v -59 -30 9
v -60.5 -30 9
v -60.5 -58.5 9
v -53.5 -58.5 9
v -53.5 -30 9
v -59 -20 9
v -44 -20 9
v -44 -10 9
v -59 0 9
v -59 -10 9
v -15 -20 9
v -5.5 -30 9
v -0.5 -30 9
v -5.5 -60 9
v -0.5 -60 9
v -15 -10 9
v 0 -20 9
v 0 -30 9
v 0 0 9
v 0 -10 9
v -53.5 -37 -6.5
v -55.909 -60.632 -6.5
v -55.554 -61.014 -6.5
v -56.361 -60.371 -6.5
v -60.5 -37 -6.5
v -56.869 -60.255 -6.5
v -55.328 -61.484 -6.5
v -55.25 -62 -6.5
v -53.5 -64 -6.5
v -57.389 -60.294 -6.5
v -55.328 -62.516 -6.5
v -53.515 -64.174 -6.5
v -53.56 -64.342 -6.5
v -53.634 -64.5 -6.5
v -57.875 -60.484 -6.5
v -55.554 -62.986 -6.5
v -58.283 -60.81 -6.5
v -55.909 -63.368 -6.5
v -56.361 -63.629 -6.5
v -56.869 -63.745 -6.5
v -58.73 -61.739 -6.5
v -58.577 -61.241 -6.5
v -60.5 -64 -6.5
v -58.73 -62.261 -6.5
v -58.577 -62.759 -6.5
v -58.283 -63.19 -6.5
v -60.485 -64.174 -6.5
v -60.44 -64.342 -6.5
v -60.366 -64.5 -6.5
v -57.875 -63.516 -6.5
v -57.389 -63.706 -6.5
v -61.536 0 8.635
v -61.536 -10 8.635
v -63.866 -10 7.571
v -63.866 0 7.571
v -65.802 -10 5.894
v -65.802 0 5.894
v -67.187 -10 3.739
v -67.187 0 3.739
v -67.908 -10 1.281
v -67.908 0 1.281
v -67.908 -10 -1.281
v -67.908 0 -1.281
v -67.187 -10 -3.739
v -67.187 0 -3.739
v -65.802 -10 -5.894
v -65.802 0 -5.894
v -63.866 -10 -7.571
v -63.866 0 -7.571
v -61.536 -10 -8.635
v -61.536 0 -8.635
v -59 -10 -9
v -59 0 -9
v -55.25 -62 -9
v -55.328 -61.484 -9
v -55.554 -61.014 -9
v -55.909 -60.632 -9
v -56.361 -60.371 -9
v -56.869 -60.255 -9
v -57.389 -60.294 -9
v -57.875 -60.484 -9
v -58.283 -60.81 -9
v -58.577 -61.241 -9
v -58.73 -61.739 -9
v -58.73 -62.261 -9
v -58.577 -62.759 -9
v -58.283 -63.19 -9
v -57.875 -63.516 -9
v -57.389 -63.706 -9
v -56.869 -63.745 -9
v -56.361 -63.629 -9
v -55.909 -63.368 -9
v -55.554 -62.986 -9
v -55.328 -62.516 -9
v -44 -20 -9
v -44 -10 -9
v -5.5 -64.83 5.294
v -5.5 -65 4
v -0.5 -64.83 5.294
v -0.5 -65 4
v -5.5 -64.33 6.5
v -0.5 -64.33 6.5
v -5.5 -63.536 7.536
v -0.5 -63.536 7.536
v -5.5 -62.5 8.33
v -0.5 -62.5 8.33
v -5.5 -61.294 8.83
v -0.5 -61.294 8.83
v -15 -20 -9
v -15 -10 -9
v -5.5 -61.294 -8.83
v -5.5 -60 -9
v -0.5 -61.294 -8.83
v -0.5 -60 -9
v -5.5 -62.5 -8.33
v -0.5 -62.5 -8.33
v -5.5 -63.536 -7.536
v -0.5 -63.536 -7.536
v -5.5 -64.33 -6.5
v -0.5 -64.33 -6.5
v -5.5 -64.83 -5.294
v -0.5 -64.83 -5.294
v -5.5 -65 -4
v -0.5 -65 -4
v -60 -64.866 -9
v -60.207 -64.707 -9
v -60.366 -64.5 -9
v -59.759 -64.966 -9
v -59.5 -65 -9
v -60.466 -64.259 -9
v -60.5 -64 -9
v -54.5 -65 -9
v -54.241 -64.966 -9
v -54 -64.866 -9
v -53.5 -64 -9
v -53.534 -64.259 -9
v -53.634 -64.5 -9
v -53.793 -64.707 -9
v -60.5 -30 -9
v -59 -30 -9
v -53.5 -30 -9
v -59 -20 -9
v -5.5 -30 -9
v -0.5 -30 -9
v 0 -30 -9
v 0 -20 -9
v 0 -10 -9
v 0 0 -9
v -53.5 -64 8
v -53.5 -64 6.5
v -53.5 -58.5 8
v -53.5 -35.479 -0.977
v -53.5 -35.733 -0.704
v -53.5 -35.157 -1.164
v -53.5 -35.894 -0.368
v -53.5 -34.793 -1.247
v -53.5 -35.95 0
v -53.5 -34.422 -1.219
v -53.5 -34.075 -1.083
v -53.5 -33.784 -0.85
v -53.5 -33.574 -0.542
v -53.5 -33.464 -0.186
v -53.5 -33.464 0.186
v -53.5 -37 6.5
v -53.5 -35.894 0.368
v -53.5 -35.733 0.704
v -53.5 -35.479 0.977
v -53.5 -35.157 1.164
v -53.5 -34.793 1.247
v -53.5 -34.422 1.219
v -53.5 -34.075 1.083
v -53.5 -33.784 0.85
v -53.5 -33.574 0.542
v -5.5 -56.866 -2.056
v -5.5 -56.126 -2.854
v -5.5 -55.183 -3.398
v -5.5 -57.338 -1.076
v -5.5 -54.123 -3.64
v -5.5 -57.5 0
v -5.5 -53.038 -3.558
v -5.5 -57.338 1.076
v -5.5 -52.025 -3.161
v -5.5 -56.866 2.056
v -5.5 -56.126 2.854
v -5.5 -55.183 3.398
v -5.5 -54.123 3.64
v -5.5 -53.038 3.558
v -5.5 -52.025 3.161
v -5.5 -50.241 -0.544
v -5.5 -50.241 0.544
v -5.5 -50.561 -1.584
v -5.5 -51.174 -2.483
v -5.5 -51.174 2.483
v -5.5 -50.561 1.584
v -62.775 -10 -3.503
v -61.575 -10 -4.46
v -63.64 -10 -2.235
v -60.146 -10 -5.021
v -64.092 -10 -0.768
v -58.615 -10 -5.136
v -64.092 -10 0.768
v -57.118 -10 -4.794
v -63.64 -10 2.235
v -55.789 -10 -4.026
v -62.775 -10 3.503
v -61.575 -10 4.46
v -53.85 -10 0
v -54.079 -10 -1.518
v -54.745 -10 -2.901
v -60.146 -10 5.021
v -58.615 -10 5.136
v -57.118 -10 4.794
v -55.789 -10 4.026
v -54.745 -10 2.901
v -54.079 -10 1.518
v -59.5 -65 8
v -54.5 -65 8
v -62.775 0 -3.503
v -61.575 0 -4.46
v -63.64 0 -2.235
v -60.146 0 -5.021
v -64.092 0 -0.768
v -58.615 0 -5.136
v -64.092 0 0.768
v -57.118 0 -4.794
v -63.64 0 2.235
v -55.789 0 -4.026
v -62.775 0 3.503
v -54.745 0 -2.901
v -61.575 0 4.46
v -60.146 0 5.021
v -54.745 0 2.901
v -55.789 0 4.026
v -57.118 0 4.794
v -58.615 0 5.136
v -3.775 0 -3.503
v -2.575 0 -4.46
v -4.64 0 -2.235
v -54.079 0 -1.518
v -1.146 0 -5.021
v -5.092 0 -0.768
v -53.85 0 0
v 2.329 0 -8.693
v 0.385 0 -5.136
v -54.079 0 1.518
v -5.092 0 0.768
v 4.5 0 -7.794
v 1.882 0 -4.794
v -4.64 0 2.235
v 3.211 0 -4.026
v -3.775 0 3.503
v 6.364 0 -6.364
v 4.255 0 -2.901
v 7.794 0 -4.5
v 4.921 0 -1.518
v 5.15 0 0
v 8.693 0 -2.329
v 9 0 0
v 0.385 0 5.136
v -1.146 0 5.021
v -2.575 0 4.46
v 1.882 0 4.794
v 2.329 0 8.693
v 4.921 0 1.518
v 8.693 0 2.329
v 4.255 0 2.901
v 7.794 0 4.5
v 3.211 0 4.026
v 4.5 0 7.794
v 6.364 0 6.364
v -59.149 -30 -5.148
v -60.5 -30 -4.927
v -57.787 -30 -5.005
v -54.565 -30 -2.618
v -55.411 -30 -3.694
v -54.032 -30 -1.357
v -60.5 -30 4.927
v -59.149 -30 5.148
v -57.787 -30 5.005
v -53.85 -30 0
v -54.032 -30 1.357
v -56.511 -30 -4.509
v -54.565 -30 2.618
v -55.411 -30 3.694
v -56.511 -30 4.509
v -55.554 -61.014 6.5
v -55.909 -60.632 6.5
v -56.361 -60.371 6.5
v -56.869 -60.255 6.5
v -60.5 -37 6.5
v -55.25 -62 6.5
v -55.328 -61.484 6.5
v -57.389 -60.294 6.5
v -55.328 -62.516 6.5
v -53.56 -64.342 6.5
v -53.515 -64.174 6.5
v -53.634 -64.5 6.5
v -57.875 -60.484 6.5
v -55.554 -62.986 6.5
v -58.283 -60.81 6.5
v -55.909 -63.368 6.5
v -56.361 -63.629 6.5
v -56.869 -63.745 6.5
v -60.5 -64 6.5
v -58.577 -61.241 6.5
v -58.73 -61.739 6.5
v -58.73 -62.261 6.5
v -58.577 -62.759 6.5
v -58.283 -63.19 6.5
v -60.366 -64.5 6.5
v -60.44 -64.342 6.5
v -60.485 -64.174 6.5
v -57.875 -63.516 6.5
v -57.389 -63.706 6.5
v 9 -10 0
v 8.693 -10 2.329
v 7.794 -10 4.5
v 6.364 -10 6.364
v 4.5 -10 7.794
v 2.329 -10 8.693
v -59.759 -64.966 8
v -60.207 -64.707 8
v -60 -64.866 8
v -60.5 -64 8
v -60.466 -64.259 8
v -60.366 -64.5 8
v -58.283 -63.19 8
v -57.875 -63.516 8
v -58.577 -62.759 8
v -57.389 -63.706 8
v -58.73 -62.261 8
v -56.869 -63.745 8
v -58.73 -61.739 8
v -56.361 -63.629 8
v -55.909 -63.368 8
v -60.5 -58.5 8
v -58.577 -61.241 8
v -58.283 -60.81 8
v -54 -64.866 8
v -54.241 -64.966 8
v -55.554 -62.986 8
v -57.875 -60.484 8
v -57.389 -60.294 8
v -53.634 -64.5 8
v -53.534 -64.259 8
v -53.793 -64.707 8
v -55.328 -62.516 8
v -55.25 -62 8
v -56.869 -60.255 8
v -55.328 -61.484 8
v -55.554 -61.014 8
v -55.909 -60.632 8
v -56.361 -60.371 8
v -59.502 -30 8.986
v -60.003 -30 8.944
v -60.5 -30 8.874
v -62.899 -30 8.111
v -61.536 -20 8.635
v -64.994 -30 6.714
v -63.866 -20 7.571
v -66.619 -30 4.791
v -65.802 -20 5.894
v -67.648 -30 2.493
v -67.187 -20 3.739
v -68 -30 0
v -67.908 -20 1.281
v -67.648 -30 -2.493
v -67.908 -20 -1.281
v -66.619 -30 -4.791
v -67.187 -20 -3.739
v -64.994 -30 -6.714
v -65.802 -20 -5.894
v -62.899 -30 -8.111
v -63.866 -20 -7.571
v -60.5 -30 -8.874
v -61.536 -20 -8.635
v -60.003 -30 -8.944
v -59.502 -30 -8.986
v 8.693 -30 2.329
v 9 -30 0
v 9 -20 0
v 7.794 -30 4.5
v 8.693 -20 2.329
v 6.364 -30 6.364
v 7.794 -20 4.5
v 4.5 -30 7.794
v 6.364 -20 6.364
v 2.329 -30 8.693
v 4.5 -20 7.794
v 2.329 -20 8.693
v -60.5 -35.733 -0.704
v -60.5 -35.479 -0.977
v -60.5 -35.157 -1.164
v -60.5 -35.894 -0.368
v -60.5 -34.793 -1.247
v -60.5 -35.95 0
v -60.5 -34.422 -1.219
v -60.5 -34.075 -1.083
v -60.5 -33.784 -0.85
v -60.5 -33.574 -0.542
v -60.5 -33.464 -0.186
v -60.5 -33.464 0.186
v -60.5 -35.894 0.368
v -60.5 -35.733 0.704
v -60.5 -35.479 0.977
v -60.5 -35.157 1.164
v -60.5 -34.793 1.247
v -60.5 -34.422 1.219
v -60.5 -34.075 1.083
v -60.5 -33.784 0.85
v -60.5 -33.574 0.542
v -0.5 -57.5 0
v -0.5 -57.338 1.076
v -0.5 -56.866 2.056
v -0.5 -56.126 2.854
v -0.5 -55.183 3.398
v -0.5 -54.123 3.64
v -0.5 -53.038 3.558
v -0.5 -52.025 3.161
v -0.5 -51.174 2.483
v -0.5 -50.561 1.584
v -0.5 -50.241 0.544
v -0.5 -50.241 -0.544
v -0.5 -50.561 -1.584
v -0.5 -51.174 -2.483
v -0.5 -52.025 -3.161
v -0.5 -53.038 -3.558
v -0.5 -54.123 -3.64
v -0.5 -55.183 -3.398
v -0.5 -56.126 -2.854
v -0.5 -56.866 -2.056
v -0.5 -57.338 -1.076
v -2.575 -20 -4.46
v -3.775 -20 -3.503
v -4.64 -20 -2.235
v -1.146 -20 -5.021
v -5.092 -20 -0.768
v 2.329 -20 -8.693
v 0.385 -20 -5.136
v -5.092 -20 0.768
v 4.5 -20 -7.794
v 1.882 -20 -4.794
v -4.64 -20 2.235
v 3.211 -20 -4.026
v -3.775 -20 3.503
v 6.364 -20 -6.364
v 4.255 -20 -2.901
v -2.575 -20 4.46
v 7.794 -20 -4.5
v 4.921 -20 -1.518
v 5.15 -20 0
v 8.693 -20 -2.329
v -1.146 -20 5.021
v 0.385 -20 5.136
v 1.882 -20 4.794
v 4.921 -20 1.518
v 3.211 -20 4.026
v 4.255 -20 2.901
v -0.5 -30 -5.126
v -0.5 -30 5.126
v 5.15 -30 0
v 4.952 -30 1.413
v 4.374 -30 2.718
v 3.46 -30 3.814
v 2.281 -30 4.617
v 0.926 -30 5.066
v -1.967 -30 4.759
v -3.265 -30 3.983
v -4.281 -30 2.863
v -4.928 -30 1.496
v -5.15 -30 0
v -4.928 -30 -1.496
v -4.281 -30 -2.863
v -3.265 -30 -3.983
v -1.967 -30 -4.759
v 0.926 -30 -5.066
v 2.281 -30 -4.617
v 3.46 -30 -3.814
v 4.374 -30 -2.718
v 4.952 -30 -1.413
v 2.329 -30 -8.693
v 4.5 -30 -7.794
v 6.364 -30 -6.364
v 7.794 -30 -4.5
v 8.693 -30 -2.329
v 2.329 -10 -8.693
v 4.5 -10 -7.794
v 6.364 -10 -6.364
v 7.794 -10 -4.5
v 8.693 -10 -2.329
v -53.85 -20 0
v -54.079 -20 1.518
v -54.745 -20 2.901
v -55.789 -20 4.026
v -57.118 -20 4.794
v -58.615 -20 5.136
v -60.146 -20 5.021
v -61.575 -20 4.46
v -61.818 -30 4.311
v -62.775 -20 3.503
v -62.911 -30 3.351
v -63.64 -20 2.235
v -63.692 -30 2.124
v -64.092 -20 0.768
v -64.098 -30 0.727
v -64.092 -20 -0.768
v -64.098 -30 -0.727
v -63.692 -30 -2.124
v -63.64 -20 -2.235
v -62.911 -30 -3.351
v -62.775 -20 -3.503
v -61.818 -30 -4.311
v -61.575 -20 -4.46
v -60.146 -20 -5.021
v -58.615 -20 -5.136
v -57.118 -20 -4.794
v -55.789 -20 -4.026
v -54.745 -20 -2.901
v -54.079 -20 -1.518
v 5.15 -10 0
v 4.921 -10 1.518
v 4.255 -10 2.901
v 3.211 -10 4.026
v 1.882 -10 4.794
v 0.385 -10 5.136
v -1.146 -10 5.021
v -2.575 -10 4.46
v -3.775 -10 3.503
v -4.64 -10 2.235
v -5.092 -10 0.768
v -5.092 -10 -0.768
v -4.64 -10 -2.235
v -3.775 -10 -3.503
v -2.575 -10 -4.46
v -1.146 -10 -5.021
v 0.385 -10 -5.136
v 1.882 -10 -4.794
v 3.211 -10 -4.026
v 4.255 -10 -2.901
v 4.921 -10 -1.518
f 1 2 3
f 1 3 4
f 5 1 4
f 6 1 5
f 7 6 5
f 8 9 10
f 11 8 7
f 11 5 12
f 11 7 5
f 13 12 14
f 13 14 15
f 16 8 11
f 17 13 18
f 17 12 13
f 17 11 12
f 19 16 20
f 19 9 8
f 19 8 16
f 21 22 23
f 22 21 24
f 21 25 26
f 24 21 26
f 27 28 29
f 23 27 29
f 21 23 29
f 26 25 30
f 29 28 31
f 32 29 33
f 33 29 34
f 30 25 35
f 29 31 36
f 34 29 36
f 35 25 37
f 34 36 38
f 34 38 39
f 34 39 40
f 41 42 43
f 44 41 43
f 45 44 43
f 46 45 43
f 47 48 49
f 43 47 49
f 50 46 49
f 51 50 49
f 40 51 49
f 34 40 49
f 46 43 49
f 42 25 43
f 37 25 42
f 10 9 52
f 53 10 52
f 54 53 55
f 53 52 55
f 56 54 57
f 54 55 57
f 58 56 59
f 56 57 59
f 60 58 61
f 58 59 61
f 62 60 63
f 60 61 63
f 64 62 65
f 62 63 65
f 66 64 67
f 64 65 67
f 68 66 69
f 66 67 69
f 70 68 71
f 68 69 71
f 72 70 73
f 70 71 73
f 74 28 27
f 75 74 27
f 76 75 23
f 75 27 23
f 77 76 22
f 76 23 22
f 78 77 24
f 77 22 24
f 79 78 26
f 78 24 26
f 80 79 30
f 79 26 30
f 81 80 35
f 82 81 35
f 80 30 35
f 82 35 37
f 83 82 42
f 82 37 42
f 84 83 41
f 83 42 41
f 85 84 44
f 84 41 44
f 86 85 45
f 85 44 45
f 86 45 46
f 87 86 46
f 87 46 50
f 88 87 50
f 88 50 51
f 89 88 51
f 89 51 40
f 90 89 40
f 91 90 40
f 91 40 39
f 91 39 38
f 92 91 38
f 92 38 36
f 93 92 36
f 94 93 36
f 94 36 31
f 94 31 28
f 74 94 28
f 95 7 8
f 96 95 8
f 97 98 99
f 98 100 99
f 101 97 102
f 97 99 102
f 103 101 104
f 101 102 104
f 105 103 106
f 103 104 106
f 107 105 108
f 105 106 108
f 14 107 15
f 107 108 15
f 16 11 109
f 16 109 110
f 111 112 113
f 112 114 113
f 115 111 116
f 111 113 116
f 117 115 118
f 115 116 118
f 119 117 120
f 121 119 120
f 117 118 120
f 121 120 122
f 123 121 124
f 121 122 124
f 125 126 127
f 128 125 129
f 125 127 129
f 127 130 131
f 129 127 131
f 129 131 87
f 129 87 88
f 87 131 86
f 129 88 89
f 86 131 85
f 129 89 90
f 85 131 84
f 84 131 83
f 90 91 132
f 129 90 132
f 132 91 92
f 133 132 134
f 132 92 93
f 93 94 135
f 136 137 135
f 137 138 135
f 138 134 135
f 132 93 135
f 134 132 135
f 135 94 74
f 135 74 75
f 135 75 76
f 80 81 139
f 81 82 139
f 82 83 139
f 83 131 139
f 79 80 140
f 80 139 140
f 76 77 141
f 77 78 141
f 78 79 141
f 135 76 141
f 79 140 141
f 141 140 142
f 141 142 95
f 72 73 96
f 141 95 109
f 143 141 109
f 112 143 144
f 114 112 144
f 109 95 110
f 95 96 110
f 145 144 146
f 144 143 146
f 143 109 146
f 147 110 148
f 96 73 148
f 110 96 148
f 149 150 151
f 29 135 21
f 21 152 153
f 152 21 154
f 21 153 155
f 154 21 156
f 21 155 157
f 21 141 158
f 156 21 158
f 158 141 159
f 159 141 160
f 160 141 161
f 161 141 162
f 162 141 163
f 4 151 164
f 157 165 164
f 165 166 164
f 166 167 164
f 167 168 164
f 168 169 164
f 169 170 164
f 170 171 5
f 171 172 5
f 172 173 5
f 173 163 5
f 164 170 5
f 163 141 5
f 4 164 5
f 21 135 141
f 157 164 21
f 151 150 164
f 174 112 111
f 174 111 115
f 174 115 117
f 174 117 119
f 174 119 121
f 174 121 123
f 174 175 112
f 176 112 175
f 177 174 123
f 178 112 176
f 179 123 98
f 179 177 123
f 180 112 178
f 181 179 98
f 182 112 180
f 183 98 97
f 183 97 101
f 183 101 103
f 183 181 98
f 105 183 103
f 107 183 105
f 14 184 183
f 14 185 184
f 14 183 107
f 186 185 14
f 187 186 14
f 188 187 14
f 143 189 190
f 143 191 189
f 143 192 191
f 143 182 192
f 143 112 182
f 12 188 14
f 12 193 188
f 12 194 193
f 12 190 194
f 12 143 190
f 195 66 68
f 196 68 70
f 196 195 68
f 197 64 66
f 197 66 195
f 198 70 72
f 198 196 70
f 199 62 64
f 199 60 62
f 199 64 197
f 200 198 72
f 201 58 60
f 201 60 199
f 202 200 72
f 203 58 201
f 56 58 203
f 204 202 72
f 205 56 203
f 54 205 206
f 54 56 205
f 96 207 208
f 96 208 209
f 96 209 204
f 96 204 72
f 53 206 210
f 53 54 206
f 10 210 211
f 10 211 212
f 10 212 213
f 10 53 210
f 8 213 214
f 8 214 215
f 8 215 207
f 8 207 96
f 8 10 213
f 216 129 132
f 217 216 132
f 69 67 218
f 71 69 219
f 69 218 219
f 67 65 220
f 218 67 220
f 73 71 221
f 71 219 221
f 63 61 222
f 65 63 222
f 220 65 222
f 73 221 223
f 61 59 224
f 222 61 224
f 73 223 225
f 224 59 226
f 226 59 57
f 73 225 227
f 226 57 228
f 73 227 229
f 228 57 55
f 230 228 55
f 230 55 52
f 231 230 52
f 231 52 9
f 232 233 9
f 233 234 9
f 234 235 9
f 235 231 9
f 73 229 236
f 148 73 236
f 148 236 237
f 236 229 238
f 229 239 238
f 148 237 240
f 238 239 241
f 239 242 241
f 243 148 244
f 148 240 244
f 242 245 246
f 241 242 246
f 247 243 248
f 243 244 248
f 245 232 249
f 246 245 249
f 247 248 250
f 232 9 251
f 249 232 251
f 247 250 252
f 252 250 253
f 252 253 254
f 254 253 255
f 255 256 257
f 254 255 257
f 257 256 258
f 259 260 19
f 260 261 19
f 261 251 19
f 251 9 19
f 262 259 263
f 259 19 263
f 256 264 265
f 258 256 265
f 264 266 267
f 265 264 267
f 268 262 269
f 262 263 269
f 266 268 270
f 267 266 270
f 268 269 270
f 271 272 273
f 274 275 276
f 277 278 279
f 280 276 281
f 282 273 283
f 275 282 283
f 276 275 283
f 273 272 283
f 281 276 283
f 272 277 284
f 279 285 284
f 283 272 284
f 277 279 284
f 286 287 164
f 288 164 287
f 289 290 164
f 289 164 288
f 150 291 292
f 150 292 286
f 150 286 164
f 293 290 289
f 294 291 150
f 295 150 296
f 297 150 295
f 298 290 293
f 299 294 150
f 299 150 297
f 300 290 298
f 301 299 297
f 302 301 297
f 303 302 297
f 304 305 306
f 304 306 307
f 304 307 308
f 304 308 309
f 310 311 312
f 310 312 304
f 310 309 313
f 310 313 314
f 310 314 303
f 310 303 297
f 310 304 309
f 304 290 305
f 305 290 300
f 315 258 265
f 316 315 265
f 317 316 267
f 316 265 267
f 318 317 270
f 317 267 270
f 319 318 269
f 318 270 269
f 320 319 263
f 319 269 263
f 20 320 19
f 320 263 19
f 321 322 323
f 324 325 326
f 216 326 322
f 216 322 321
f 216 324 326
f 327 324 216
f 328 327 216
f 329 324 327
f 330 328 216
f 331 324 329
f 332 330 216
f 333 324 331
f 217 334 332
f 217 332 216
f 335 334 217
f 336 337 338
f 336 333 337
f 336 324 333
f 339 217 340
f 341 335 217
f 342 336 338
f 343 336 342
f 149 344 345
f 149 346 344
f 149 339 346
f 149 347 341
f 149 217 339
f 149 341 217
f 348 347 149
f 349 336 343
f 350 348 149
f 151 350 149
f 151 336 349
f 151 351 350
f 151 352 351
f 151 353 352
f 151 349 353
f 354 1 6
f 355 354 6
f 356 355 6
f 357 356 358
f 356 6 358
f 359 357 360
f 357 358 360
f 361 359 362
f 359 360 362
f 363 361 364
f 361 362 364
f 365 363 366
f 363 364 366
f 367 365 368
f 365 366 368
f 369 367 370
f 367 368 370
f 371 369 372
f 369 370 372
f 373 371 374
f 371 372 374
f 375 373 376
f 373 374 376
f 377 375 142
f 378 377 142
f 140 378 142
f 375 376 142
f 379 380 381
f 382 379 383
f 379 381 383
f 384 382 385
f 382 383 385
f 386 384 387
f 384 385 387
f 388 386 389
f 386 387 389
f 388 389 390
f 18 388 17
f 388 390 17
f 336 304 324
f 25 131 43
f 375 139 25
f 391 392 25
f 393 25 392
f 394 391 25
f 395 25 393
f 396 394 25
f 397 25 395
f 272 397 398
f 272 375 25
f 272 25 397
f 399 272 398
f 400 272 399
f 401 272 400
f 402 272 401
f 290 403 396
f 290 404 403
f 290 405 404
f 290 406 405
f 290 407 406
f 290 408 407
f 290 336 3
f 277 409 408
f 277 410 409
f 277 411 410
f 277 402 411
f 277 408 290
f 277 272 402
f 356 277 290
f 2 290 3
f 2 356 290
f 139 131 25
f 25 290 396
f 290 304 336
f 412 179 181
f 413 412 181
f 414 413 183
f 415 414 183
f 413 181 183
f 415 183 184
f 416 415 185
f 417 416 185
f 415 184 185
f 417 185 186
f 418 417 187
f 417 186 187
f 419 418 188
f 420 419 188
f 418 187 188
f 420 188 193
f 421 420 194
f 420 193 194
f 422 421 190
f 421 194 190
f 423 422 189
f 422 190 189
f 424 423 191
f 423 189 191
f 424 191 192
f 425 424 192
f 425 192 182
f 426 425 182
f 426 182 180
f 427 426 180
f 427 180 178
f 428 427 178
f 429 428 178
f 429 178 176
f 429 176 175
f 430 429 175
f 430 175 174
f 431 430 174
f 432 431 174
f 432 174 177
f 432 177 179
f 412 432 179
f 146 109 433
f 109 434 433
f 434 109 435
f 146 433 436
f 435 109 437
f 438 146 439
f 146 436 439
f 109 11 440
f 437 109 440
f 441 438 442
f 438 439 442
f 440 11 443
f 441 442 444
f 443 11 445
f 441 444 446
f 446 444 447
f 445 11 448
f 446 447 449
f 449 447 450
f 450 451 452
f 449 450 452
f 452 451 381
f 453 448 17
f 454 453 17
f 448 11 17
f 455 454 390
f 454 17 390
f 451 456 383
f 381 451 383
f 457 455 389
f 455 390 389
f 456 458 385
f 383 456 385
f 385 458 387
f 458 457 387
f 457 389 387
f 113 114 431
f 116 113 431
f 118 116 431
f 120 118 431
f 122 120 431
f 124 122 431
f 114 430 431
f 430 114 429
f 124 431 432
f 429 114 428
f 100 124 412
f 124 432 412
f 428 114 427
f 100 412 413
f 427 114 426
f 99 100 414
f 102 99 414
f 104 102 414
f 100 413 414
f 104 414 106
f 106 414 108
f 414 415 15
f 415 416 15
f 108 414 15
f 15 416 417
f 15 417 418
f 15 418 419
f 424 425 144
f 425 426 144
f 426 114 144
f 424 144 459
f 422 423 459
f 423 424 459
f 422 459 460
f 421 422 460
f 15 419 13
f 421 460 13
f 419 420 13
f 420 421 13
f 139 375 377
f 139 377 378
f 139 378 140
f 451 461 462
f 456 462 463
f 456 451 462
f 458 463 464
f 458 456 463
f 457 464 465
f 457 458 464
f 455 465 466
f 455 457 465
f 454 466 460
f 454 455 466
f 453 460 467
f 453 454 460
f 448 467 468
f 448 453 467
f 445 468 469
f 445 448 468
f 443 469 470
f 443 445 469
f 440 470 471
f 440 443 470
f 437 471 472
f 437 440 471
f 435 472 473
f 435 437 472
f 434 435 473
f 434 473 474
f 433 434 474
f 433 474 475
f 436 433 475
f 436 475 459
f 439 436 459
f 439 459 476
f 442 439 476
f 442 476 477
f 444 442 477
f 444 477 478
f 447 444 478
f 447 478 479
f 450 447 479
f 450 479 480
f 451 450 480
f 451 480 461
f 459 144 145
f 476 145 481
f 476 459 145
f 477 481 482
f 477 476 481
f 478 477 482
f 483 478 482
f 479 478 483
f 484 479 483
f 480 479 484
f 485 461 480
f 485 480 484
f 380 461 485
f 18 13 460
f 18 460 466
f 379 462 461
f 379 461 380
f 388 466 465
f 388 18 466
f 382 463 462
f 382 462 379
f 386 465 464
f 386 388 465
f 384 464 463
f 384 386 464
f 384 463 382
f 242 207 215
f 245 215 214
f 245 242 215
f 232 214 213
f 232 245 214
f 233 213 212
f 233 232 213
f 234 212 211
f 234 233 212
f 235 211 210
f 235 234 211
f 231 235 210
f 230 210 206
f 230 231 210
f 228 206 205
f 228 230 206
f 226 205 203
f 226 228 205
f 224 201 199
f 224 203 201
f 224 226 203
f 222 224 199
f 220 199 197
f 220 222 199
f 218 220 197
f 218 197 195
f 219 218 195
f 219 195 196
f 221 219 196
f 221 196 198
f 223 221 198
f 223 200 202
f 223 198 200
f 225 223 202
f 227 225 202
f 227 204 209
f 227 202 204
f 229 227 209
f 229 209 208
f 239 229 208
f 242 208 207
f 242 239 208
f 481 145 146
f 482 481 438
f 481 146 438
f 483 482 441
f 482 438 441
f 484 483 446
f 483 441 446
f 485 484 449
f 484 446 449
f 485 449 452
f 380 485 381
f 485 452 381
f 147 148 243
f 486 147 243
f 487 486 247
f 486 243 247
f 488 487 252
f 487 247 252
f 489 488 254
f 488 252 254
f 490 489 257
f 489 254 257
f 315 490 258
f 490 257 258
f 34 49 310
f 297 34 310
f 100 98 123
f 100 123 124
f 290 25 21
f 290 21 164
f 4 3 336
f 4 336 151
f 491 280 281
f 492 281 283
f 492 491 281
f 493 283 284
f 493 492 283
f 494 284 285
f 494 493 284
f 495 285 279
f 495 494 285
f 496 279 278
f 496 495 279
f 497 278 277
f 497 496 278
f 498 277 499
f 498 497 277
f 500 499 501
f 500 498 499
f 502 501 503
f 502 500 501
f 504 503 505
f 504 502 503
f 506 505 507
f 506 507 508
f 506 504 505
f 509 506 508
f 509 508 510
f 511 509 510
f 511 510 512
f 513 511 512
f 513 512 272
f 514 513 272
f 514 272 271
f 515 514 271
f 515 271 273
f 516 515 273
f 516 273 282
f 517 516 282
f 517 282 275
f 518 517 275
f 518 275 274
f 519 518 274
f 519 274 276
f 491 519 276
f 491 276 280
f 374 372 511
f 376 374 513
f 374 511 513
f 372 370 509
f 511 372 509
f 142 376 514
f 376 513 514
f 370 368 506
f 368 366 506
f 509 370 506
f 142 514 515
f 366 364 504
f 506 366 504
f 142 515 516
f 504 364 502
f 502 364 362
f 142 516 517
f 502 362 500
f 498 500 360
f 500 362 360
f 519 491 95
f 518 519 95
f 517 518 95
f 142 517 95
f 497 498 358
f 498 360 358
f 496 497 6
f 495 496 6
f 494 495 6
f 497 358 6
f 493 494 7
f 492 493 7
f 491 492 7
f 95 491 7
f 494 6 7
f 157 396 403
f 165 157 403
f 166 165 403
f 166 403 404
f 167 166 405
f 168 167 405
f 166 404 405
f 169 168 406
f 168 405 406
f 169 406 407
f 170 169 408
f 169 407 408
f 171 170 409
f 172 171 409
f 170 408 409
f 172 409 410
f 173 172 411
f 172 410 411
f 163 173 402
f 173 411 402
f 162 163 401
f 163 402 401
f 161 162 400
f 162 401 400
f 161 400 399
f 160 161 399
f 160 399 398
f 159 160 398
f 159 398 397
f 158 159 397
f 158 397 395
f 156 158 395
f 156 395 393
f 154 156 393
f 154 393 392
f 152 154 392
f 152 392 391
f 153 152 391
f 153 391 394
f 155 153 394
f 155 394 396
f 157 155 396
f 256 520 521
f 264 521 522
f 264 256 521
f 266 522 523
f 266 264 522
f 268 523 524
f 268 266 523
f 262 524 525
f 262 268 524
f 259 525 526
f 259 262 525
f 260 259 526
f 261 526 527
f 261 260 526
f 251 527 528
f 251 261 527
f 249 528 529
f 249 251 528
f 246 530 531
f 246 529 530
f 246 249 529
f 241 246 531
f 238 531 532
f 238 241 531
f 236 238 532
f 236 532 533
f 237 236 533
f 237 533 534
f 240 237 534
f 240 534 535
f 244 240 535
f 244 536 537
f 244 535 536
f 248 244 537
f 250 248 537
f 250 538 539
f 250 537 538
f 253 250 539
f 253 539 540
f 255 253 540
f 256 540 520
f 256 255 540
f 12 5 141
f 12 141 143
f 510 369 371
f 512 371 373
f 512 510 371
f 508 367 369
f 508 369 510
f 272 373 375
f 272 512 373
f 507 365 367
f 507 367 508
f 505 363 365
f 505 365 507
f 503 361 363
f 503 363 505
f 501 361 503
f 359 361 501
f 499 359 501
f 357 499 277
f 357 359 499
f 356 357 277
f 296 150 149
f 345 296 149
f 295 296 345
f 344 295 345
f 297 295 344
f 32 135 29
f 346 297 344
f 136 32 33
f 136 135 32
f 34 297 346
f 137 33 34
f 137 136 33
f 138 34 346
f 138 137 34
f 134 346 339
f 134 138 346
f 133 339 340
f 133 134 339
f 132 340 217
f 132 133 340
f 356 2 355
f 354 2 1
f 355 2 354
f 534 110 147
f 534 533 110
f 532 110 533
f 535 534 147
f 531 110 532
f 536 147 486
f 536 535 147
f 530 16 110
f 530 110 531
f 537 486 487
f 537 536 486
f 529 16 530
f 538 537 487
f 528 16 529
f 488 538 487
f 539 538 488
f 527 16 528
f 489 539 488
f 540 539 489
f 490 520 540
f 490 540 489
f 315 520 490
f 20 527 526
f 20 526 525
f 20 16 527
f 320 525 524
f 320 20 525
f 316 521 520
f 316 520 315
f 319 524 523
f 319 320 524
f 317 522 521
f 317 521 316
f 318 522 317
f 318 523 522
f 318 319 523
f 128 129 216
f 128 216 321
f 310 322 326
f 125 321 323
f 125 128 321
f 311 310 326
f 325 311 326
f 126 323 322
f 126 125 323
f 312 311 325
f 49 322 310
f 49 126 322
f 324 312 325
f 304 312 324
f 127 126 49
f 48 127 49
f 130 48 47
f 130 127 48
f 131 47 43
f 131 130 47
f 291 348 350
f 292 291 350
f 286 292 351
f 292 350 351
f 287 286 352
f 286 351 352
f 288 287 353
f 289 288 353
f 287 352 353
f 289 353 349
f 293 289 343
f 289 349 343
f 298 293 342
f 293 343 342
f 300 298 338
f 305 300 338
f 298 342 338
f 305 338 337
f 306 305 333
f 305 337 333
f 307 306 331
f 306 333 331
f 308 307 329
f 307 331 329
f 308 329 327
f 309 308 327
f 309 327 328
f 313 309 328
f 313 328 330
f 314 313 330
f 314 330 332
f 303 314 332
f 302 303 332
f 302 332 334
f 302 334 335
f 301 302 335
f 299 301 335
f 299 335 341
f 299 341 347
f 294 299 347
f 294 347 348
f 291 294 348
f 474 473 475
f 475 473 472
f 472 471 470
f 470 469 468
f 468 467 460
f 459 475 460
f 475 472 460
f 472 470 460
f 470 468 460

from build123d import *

# Parameters (mm, degrees)
F0_R         = 5.15
F1_DEPTH     = 30
F2_W         = 26.2453191746
F2_H         = 10
F2_W_2       = 30.2312795687
F3_DEPTH     = 25
F4_W         = 5
F4_H         = 18
F4_W_2       = 7
F5_DEPTH     = 35
F6_W         = 27.5
F6_H         = 13
F6_R         = 1.25
F7_DEPTH     = 25
F8_R         = 3.65
F9_DEPTH     = 25
F10_R        = 5
F11_R        = 1.75
F12_DEPTH    = 25
F13_W        = 7
F13_H        = 6.5
F14_DEPTH    = 1
F15_T1_DEPTH = 22


# Not quite as in the source:
# - a fillet or chamfer that OpenCascade refuses, or shapes differently, is made with other operations: its cross-section is extruded or revolved along the edge and cut away or added


with BuildPart() as f1:
    # F0 (on Front) → F1 (new body)
    with BuildSketch(Plane.XZ):
        with BuildLine():
            ThreePointArc((-59, -9), (-52.6360389693, -6.3639610307), (-50, 0))
            ThreePointArc((-50, 0), (-52.6360389693, 6.3639610307), (-59, 9))
            ThreePointArc((-59, 9), (-68, 0), (-59, -9))
        make_face()
        with Locations((-59, 0)):
            Circle(F0_R, mode=Mode.SUBTRACT)
        with BuildLine():
            ThreePointArc((-59, 9), (-52.6360389693, 6.3639610307), (-50, 0))
            ThreePointArc((-50, 0), (-52.6360389693, -6.3639610307), (-59, -9))
            Line((-59, -9), (0, -9))
            ThreePointArc((0, -9), (-9, 0), (0, 9))
            Line((0, 9), (-59, 9))
        make_face()
        with BuildLine():
            ThreePointArc((9, 0), (6.3639610307, 6.3639610307), (0, 9))
            ThreePointArc((0, 9), (-9, 0), (0, -9))
            ThreePointArc((0, -9), (6.3639610307, -6.3639610307), (9, 0))
        make_face()
        Circle(F0_R, mode=Mode.SUBTRACT)
    extrude(amount=F1_DEPTH)

    # F2 (on face) → F3 (cut)
    with BuildSketch(Plane.XY.offset(9)):
        with Locations((-1.8773404127, -15)):
            Rectangle(F2_W, F2_H)
        with Locations((-59.1156397844, -15)):
            Rectangle(F2_W_2, F2_H)
    extrude(amount=-F3_DEPTH, mode=Mode.SUBTRACT)

    # F4 (on face) → F5 (join)
    with BuildSketch(Plane.XZ.offset(30)):
        with Locations((-3, 0)):
            Rectangle(F4_W, F4_H)
        with Locations((-57, 0)):
            Rectangle(F4_W_2, F4_H)
    extrude(amount=F5_DEPTH)

    # F6 (on face) → F7 (cut)
    with BuildSketch(Plane(origin=(-60.5, 0, 0), x_dir=(0, -1, 0), z_dir=(-1, 0, 0))):
        with Locations((50.75, 0)):
            Rectangle(F6_W, F6_H)
        with Locations((34.7, 0)):
            Circle(F6_R)
    extrude(amount=-F7_DEPTH, mode=Mode.SUBTRACT)

    # F8 (on face) → F9 (cut)
    with BuildSketch(Plane(origin=(-5.5, 0, 0), x_dir=(0, -1, 0), z_dir=(-1, 0, 0))):
        with Locations((53.85, 0)):
            Circle(F8_R)
    extrude(amount=-F9_DEPTH, mode=Mode.SUBTRACT)

    # F10
    f10_edges = [f1.edges().sort_by_distance(p)[0] for p in [
        (-3, -65, 9),
        (-3, -65, -9),
    ]]
    fillet(f10_edges, radius=F10_R)

    # F11 (on face) → F12 (cut)
    with BuildSketch(Plane.XY.offset(9)):
        with Locations((-57, -62)):
            Circle(F11_R)
    extrude(amount=-F12_DEPTH, mode=Mode.SUBTRACT)

    # F13 (on face) → F14 (cut)
    with BuildSketch(Plane.XY.offset(9)):
        with Locations((-57, -61.75)):
            Rectangle(F13_W, F13_H)
    extrude(amount=-F14_DEPTH, mode=Mode.SUBTRACT)

    # F15: fillet of radius 1 on 2 edges, made by hand

    # F15_s2 → F15_t1 (cut)
    with BuildSketch(Plane.XY.offset(-11.5)):
        with BuildLine():
            ThreePointArc((-59.5, -65), (-60.2071067812, -64.7071067812), (-60.5, -64))
            Line((-60.5, -64), (-60.5, -65))
            Line((-60.5, -65), (-59.5, -65))
        make_face()
        with BuildLine():
            ThreePointArc((-53.5, -64), (-53.7928932188, -64.7071067812), (-54.5, -65))
            Line((-54.5, -65), (-53.5, -65))
            Line((-53.5, -65), (-53.5, -64))
        make_face()
    extrude(amount=F15_T1_DEPTH, mode=Mode.SUBTRACT)


solid = f1.part
